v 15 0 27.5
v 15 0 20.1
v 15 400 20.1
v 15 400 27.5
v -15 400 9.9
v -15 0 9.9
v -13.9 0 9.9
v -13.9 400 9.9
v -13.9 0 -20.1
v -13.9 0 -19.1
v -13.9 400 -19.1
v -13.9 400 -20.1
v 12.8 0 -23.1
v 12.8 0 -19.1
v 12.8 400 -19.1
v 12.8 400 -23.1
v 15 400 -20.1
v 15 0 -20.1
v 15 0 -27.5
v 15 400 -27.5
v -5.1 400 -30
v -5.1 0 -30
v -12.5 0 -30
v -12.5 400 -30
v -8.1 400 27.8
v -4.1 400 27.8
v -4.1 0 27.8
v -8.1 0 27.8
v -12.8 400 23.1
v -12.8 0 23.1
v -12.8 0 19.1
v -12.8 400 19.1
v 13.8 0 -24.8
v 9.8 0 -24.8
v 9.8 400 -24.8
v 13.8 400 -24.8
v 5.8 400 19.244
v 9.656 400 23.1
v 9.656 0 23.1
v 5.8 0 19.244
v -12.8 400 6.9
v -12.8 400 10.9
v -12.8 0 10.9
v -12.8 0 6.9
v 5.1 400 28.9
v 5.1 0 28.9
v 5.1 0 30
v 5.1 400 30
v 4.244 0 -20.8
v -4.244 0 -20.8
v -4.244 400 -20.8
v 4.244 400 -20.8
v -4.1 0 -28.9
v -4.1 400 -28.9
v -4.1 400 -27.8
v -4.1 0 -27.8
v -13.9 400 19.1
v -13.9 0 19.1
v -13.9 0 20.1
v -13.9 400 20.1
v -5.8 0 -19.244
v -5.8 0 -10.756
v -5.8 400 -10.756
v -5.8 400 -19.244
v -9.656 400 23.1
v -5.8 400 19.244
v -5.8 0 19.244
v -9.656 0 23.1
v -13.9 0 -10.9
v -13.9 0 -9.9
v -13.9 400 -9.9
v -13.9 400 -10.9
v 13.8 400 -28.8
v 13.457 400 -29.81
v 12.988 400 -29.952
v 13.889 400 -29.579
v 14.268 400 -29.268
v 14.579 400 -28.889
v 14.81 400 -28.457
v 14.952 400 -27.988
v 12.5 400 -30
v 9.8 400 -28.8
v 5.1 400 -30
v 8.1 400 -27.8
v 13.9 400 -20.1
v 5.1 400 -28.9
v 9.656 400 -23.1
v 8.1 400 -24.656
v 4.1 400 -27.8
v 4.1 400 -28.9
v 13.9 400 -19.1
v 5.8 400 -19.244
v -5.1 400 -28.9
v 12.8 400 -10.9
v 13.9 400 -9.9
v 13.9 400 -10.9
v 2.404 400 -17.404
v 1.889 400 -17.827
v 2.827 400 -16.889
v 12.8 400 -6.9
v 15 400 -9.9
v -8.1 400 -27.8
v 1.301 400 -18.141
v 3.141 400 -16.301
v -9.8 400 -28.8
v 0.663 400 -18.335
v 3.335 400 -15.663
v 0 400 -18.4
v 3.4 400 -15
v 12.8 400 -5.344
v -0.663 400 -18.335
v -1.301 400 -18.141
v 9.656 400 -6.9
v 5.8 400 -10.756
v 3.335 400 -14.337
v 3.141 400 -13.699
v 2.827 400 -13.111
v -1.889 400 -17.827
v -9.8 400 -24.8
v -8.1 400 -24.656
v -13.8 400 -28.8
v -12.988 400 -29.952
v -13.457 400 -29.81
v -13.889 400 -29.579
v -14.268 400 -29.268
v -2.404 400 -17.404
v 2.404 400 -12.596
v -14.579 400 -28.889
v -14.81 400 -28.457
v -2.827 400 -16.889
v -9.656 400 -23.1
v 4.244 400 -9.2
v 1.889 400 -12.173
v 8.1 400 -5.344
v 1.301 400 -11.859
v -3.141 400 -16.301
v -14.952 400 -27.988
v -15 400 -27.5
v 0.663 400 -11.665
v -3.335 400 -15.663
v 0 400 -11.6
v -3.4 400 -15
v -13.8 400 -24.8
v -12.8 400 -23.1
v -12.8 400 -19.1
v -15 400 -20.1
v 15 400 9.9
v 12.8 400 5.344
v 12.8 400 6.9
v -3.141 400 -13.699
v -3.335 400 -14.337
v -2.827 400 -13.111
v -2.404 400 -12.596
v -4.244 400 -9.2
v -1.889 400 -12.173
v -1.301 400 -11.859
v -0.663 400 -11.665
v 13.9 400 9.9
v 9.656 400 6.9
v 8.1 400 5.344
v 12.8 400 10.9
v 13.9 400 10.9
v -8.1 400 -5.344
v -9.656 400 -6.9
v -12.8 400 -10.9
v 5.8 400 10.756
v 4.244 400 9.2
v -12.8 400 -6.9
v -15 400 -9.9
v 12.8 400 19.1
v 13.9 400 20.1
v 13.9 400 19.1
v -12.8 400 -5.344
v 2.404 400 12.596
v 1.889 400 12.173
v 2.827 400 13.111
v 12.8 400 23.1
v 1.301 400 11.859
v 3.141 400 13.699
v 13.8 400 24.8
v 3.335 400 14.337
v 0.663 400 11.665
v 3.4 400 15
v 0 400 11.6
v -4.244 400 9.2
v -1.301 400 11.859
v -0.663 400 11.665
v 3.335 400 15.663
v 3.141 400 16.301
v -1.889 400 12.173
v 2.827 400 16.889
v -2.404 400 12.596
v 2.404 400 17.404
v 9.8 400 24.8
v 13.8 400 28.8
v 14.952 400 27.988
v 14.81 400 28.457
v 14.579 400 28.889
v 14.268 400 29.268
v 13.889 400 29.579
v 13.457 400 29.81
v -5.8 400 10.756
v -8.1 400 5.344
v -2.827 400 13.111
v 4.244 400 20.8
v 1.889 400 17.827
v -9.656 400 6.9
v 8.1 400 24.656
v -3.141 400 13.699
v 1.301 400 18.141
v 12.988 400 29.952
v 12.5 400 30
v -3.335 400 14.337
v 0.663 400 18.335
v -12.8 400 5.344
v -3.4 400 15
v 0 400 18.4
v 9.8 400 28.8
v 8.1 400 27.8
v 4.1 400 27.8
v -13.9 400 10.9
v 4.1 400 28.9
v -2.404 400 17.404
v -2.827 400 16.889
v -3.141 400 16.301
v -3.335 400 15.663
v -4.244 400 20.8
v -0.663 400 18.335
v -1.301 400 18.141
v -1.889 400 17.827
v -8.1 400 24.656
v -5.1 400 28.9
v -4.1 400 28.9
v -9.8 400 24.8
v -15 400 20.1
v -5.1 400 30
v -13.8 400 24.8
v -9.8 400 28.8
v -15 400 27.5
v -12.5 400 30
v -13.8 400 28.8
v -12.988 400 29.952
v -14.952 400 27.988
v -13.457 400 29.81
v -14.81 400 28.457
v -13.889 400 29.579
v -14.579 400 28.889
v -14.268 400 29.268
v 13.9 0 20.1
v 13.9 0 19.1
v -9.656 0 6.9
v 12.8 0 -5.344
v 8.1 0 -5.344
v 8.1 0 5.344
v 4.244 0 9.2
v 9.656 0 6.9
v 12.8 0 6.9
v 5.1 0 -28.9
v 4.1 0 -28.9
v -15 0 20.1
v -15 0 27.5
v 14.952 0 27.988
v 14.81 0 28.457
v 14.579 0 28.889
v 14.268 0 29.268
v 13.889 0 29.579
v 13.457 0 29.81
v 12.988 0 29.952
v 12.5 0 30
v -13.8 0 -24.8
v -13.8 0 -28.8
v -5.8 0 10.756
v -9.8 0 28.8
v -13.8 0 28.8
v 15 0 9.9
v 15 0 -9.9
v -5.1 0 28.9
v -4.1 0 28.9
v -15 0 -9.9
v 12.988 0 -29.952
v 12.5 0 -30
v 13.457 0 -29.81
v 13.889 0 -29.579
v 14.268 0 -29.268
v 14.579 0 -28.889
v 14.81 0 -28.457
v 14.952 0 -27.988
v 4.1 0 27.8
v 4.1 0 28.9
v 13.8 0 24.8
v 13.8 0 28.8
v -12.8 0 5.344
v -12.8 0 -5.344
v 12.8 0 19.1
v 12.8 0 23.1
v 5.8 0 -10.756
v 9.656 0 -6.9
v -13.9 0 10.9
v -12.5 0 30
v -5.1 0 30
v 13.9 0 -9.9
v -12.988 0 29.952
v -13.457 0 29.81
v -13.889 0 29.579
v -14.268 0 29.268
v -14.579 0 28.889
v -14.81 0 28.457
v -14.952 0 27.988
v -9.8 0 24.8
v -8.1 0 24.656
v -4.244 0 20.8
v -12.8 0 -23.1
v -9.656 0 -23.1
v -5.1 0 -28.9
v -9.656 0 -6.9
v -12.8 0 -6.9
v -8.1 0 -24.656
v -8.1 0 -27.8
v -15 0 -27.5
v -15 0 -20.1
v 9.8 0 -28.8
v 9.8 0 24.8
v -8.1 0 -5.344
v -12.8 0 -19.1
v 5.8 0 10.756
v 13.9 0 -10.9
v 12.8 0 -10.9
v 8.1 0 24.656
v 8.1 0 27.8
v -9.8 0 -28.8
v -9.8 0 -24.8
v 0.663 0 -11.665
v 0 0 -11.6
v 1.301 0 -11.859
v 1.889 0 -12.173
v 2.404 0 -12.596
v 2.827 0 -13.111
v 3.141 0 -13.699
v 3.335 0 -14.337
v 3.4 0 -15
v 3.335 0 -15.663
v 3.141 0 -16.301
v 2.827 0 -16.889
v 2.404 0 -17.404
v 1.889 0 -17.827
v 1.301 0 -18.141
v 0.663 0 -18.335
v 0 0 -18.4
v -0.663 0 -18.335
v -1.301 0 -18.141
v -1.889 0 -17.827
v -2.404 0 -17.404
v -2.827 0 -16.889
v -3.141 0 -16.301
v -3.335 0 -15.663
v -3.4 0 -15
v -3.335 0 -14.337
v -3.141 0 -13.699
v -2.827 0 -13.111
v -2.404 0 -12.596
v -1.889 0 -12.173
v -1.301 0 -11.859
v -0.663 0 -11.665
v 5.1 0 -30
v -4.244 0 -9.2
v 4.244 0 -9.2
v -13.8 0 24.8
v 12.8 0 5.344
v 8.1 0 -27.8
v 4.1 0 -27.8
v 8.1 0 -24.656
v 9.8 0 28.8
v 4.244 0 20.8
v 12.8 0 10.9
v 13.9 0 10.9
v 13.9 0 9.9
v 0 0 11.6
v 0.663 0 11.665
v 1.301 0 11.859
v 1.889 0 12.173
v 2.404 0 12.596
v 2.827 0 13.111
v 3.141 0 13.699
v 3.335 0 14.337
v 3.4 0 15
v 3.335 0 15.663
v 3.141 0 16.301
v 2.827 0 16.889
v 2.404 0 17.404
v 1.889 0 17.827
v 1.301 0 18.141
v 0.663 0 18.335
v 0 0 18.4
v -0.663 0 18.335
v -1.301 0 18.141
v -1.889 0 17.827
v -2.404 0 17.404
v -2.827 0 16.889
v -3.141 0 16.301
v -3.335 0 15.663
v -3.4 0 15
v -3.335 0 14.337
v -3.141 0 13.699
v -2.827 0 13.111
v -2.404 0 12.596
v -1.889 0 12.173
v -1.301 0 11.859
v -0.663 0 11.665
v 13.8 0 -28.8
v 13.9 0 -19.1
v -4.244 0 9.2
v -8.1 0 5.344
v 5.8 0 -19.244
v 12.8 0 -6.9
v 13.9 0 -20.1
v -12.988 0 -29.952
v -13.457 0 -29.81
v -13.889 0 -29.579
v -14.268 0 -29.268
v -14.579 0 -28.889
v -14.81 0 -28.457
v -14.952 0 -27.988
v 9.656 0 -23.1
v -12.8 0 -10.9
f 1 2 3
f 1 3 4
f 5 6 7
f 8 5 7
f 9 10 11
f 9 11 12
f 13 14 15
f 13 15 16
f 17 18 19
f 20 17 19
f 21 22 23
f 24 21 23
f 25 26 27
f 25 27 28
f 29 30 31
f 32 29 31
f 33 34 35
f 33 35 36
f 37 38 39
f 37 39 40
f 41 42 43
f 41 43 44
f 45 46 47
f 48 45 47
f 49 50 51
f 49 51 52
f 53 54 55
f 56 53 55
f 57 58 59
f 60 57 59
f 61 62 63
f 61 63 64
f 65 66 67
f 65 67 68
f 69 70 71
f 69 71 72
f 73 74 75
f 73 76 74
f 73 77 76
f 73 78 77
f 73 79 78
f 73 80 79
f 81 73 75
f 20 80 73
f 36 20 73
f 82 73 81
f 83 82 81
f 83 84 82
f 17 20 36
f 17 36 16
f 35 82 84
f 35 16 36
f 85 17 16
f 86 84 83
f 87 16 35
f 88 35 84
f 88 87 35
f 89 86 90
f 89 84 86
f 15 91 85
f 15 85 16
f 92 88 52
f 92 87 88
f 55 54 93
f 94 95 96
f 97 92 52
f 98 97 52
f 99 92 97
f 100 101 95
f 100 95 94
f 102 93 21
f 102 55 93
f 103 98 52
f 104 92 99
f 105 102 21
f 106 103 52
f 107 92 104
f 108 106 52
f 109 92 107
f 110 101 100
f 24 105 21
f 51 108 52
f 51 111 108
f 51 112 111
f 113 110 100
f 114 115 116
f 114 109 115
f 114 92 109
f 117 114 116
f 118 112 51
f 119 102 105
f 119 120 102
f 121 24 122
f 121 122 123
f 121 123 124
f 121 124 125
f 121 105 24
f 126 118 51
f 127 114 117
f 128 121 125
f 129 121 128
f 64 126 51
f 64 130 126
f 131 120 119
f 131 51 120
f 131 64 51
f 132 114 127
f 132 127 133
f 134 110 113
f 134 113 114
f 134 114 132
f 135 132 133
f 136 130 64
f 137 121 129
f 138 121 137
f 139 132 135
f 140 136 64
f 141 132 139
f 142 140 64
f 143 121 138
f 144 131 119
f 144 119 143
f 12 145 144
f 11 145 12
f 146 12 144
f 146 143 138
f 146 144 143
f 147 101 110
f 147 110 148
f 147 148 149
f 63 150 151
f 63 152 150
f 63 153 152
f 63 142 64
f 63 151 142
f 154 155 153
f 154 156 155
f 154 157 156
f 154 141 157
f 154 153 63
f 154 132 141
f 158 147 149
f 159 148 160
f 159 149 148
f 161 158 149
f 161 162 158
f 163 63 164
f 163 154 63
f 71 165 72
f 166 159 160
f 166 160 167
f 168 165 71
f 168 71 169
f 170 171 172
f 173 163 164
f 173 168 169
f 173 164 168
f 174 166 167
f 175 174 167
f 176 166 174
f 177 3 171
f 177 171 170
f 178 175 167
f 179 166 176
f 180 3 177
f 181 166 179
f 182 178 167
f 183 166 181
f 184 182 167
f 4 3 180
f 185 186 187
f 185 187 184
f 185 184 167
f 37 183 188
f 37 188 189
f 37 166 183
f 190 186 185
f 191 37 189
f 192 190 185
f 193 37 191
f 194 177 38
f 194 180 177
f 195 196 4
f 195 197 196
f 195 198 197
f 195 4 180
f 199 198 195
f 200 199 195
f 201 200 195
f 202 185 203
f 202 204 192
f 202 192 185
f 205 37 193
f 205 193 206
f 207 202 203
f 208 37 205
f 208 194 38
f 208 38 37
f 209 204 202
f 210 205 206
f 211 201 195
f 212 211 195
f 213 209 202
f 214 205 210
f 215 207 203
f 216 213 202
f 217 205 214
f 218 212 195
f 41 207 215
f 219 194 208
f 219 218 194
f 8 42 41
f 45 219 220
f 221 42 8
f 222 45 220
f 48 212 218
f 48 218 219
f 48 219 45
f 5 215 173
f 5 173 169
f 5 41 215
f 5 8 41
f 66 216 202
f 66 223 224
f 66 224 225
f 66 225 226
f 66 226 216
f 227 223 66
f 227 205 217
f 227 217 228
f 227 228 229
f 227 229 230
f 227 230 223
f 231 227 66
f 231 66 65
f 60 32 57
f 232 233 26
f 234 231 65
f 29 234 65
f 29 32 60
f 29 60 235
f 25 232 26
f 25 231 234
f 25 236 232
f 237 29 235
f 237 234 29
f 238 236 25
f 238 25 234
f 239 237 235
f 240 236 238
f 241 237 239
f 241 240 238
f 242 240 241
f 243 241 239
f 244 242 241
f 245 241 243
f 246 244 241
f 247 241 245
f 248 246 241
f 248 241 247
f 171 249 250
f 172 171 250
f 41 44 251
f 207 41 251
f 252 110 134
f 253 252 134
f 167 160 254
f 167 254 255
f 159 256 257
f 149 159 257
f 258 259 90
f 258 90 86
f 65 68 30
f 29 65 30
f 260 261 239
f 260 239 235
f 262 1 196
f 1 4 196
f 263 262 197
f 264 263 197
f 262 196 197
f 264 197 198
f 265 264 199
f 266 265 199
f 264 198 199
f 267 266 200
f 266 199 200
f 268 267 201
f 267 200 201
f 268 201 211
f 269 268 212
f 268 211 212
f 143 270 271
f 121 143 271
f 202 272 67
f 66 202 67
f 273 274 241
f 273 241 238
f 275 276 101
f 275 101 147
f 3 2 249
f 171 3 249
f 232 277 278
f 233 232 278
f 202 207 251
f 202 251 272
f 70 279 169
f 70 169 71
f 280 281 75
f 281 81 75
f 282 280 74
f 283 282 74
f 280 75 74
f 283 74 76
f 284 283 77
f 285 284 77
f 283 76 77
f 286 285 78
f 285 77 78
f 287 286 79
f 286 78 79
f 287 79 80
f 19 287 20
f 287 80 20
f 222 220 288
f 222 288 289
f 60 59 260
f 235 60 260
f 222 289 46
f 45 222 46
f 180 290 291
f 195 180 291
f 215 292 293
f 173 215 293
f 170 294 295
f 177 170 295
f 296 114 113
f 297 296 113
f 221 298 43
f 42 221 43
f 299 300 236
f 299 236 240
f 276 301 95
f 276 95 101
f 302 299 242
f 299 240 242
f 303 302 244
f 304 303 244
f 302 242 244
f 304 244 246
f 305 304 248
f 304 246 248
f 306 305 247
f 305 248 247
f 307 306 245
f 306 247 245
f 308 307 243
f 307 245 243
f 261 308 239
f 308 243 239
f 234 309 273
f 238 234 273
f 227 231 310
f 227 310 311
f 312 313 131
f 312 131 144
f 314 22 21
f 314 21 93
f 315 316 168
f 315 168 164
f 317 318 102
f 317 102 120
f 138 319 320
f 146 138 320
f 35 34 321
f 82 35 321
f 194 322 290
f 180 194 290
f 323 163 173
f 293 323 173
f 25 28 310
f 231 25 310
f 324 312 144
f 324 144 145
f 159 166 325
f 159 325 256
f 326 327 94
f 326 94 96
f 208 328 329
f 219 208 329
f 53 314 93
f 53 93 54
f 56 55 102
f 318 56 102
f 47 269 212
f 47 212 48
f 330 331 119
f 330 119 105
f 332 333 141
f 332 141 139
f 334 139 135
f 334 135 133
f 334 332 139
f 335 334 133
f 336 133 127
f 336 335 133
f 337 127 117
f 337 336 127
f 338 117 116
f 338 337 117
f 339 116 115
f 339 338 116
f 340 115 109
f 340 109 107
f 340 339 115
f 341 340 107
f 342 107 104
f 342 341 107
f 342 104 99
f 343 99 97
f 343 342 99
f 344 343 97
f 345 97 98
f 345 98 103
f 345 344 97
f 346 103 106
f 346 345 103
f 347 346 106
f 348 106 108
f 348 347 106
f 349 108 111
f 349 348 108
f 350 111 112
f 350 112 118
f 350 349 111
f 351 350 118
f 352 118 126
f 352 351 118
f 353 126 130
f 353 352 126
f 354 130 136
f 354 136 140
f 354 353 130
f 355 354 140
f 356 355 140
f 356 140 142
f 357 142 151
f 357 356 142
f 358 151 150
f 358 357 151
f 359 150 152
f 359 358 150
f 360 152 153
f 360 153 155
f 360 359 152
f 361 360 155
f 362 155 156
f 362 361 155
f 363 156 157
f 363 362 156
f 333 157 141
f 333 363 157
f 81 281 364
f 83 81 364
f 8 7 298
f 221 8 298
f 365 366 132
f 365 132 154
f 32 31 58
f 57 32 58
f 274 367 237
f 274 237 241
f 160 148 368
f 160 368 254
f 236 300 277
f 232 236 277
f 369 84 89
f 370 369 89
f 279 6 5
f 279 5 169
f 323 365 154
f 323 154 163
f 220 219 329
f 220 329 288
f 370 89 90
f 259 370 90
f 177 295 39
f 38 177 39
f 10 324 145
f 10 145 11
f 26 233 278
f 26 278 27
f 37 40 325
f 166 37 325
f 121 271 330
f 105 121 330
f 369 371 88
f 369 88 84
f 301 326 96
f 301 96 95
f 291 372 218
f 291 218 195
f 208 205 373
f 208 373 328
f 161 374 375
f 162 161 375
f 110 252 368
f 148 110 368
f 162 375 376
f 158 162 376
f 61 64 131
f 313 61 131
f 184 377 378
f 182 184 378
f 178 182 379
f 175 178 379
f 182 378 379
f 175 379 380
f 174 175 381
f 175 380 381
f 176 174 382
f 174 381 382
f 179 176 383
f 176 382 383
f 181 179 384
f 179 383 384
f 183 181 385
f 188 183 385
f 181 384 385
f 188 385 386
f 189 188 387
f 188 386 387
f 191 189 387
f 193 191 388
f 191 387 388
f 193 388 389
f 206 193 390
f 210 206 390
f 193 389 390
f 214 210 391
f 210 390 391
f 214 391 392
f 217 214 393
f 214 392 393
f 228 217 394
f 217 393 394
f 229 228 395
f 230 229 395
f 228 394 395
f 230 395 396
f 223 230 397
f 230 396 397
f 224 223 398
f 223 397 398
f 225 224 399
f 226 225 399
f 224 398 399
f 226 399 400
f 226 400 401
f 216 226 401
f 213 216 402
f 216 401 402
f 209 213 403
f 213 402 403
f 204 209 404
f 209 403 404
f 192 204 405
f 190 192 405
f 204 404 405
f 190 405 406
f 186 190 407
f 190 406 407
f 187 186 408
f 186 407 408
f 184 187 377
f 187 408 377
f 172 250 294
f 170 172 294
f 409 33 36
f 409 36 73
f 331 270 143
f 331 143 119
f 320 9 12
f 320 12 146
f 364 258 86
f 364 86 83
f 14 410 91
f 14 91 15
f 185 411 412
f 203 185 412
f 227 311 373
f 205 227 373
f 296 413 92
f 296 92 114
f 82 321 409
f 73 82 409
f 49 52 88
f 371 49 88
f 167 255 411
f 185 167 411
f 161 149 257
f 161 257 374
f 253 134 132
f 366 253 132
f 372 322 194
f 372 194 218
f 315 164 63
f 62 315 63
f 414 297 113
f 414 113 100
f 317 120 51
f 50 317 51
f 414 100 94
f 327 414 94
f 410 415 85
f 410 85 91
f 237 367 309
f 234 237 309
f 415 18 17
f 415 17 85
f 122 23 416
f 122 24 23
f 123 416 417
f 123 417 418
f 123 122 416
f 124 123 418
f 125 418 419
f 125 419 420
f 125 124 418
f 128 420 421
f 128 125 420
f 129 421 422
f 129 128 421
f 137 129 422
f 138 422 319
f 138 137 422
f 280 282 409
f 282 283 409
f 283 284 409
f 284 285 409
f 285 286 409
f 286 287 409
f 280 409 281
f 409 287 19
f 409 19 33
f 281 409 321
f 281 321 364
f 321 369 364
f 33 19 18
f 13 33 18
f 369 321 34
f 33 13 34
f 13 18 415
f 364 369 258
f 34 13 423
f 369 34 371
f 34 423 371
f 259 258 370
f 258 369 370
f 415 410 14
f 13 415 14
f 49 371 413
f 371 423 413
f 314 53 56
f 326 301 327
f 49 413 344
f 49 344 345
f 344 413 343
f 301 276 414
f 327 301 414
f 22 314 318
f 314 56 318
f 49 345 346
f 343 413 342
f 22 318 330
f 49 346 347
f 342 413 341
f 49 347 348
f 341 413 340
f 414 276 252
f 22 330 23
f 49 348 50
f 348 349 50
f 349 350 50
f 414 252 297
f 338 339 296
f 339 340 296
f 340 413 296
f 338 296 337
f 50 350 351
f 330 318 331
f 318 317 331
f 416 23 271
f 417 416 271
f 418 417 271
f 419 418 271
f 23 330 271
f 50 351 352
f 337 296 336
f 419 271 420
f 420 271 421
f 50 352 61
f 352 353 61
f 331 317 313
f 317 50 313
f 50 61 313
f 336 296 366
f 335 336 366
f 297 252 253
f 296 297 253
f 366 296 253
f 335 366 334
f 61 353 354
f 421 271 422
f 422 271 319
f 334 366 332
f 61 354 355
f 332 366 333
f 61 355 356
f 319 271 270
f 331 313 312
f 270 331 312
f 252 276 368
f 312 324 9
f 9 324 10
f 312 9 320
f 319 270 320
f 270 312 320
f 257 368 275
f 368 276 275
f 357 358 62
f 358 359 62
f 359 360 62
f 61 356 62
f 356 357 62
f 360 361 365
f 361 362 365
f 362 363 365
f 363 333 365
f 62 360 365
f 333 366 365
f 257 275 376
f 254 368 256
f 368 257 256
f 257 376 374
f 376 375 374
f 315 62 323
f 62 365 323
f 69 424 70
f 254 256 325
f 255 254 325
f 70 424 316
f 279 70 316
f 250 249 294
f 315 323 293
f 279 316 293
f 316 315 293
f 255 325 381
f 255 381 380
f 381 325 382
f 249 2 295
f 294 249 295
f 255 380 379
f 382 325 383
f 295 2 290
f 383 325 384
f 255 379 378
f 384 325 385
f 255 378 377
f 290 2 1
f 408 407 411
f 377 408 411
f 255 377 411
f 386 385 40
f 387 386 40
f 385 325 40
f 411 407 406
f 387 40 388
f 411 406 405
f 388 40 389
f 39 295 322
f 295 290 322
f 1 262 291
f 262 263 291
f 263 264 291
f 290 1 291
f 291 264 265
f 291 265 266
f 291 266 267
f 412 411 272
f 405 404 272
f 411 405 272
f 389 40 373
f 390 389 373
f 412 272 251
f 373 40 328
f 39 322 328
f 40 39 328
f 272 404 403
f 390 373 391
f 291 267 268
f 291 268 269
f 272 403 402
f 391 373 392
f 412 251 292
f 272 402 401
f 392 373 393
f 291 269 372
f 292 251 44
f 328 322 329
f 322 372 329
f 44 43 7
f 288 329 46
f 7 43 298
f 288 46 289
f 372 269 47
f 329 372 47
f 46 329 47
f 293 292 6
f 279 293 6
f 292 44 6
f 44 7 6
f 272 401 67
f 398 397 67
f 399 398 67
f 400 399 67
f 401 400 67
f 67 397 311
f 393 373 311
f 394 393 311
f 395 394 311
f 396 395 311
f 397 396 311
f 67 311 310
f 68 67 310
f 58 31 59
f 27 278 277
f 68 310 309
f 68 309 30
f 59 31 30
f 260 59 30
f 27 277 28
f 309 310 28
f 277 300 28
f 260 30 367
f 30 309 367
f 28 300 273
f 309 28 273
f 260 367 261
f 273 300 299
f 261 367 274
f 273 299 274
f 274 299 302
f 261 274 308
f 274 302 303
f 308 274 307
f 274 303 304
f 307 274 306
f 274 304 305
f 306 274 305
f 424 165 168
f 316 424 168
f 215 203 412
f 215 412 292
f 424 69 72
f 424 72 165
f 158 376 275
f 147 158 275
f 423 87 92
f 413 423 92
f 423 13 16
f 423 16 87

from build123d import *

# Parameters (mm, degrees)
SKETCH1_R            = 3.4
SKETCH1_W            = 4
SKETCH1_H            = 4
BOSS_EXTRUDE1_DEPTH  = 400
FILLET1_R            = 2.5
FILLET1_OF_MIRROR1_R = 2.5


with BuildPart() as part:
    # Sketch1 → Boss-Extrude1 (new body)
    with BuildSketch(Plane(origin=(0, 0, 0), x_dir=(1, 0, 0), z_dir=(0, 1, 0))):
        Polygon((-4.244365081, 20.8), (4.244365081, 20.8), (8.1, 24.655634919), (8.1, 27.8), (4.1, 27.8), (4.1, 28.9), (5.1, 28.9), (5.1, 30), (13.444365081, 30), (15, 30), (15, 28.444365081), (15, 20.1), (13.9, 20.1), (13.9, 19.1), (12.8, 19.1), (12.8, 23.1), (9.655634919, 23.1), (5.8, 19.244365081), (5.8, 10.755634919), (9.655634919, 6.9), (12.8, 6.9), (12.8, 10.9), (13.9, 10.9), (13.9, 9.9), (15, 9.9), (15, 1.555634919), (15, 0), (13.444365081, 0), (12.8, 0), (12.8, 5.344365081), (8.1, 5.344365081), (4.244365081, 9.2), (-4.244365081, 9.2), (-8.1, 5.344365081), (-12.8, 5.344365081), (-12.8, 0), (-13.444365081, 0), (-15, 0), (-15, 1.555634919), (-15, 9.9), (-13.9, 9.9), (-13.9, 10.9), (-12.8, 10.9), (-12.8, 6.9), (-9.655634919, 6.9), (-5.8, 10.755634919), (-5.8, 19.244365081), (-9.655634919, 23.1), (-12.8, 23.1), (-12.8, 19.1), (-13.9, 19.1), (-13.9, 20.1), (-15, 20.1), (-15, 28.444365081), (-15, 30), (-13.444365081, 30), (-5.1, 30), (-5.1, 28.9), (-4.1, 28.9), (-4.1, 27.8), (-8.1, 27.8), (-8.1, 24.655634919), align=None)
        with Locations(Location((0, 15, 0), (0, 0, 270))):
            Circle(SKETCH1_R, mode=Mode.SUBTRACT)
        with Locations((11.8, 26.8)):
            Rectangle(SKETCH1_W, SKETCH1_H, mode=Mode.SUBTRACT)
        with Locations((-11.8, 26.8)):
            Rectangle(SKETCH1_W, SKETCH1_H, mode=Mode.SUBTRACT)
    boss_extrude1 = extrude(amount=BOSS_EXTRUDE1_DEPTH)

    # Fillet1
    fillet1_edges = [part.edges().sort_by_distance(p)[0] for p in [
        (15, 200, -30),
        (-15, 200, -30),
    ]]
    fillet(fillet1_edges, radius=FILLET1_R)

    # Mirror1: Boss-Extrude1 across plane
    add(boss_extrude1.mirror(Plane.XY))

    # Fillet1 of Mirror1
    fillet1_of_mirror1_edges = [part.edges().sort_by_distance(p)[0] for p in [
        (15, 200, 30),
        (-15, 200, 30),
    ]]
    fillet(fillet1_of_mirror1_edges, radius=FILLET1_OF_MIRROR1_R)


solid = part.part
